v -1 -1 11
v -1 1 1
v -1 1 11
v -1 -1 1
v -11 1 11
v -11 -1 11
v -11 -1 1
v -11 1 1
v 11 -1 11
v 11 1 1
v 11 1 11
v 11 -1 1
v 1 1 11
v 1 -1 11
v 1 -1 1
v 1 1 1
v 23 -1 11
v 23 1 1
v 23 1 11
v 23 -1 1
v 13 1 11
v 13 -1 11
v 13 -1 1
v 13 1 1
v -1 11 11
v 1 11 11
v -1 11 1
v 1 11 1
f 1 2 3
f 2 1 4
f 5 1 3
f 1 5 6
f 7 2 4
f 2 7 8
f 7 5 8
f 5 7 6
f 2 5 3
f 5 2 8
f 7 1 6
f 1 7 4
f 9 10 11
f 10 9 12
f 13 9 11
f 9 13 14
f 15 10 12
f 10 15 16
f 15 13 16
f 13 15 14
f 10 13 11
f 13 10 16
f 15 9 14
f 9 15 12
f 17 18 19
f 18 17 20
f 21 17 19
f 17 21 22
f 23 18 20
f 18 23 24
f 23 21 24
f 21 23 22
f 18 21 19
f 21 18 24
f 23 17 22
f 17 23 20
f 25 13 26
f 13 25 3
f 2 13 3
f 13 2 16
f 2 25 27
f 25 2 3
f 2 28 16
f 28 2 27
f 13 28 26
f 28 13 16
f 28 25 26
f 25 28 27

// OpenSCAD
width = 10;
height = 10;
depth = 2;
pitch = 12;

module element(x=1, y=1, z=1, r=0) {
    rotate([0,0,r]) {
        translate([depth/2 + x*pitch, y*pitch - depth/2, z*pitch + depth/2]) {
            cube([width, depth, height]);
        }
    }
}

element(-1,0,0);
element(0,0,0);
element(1,0,0);

element(0,0,0,90);
